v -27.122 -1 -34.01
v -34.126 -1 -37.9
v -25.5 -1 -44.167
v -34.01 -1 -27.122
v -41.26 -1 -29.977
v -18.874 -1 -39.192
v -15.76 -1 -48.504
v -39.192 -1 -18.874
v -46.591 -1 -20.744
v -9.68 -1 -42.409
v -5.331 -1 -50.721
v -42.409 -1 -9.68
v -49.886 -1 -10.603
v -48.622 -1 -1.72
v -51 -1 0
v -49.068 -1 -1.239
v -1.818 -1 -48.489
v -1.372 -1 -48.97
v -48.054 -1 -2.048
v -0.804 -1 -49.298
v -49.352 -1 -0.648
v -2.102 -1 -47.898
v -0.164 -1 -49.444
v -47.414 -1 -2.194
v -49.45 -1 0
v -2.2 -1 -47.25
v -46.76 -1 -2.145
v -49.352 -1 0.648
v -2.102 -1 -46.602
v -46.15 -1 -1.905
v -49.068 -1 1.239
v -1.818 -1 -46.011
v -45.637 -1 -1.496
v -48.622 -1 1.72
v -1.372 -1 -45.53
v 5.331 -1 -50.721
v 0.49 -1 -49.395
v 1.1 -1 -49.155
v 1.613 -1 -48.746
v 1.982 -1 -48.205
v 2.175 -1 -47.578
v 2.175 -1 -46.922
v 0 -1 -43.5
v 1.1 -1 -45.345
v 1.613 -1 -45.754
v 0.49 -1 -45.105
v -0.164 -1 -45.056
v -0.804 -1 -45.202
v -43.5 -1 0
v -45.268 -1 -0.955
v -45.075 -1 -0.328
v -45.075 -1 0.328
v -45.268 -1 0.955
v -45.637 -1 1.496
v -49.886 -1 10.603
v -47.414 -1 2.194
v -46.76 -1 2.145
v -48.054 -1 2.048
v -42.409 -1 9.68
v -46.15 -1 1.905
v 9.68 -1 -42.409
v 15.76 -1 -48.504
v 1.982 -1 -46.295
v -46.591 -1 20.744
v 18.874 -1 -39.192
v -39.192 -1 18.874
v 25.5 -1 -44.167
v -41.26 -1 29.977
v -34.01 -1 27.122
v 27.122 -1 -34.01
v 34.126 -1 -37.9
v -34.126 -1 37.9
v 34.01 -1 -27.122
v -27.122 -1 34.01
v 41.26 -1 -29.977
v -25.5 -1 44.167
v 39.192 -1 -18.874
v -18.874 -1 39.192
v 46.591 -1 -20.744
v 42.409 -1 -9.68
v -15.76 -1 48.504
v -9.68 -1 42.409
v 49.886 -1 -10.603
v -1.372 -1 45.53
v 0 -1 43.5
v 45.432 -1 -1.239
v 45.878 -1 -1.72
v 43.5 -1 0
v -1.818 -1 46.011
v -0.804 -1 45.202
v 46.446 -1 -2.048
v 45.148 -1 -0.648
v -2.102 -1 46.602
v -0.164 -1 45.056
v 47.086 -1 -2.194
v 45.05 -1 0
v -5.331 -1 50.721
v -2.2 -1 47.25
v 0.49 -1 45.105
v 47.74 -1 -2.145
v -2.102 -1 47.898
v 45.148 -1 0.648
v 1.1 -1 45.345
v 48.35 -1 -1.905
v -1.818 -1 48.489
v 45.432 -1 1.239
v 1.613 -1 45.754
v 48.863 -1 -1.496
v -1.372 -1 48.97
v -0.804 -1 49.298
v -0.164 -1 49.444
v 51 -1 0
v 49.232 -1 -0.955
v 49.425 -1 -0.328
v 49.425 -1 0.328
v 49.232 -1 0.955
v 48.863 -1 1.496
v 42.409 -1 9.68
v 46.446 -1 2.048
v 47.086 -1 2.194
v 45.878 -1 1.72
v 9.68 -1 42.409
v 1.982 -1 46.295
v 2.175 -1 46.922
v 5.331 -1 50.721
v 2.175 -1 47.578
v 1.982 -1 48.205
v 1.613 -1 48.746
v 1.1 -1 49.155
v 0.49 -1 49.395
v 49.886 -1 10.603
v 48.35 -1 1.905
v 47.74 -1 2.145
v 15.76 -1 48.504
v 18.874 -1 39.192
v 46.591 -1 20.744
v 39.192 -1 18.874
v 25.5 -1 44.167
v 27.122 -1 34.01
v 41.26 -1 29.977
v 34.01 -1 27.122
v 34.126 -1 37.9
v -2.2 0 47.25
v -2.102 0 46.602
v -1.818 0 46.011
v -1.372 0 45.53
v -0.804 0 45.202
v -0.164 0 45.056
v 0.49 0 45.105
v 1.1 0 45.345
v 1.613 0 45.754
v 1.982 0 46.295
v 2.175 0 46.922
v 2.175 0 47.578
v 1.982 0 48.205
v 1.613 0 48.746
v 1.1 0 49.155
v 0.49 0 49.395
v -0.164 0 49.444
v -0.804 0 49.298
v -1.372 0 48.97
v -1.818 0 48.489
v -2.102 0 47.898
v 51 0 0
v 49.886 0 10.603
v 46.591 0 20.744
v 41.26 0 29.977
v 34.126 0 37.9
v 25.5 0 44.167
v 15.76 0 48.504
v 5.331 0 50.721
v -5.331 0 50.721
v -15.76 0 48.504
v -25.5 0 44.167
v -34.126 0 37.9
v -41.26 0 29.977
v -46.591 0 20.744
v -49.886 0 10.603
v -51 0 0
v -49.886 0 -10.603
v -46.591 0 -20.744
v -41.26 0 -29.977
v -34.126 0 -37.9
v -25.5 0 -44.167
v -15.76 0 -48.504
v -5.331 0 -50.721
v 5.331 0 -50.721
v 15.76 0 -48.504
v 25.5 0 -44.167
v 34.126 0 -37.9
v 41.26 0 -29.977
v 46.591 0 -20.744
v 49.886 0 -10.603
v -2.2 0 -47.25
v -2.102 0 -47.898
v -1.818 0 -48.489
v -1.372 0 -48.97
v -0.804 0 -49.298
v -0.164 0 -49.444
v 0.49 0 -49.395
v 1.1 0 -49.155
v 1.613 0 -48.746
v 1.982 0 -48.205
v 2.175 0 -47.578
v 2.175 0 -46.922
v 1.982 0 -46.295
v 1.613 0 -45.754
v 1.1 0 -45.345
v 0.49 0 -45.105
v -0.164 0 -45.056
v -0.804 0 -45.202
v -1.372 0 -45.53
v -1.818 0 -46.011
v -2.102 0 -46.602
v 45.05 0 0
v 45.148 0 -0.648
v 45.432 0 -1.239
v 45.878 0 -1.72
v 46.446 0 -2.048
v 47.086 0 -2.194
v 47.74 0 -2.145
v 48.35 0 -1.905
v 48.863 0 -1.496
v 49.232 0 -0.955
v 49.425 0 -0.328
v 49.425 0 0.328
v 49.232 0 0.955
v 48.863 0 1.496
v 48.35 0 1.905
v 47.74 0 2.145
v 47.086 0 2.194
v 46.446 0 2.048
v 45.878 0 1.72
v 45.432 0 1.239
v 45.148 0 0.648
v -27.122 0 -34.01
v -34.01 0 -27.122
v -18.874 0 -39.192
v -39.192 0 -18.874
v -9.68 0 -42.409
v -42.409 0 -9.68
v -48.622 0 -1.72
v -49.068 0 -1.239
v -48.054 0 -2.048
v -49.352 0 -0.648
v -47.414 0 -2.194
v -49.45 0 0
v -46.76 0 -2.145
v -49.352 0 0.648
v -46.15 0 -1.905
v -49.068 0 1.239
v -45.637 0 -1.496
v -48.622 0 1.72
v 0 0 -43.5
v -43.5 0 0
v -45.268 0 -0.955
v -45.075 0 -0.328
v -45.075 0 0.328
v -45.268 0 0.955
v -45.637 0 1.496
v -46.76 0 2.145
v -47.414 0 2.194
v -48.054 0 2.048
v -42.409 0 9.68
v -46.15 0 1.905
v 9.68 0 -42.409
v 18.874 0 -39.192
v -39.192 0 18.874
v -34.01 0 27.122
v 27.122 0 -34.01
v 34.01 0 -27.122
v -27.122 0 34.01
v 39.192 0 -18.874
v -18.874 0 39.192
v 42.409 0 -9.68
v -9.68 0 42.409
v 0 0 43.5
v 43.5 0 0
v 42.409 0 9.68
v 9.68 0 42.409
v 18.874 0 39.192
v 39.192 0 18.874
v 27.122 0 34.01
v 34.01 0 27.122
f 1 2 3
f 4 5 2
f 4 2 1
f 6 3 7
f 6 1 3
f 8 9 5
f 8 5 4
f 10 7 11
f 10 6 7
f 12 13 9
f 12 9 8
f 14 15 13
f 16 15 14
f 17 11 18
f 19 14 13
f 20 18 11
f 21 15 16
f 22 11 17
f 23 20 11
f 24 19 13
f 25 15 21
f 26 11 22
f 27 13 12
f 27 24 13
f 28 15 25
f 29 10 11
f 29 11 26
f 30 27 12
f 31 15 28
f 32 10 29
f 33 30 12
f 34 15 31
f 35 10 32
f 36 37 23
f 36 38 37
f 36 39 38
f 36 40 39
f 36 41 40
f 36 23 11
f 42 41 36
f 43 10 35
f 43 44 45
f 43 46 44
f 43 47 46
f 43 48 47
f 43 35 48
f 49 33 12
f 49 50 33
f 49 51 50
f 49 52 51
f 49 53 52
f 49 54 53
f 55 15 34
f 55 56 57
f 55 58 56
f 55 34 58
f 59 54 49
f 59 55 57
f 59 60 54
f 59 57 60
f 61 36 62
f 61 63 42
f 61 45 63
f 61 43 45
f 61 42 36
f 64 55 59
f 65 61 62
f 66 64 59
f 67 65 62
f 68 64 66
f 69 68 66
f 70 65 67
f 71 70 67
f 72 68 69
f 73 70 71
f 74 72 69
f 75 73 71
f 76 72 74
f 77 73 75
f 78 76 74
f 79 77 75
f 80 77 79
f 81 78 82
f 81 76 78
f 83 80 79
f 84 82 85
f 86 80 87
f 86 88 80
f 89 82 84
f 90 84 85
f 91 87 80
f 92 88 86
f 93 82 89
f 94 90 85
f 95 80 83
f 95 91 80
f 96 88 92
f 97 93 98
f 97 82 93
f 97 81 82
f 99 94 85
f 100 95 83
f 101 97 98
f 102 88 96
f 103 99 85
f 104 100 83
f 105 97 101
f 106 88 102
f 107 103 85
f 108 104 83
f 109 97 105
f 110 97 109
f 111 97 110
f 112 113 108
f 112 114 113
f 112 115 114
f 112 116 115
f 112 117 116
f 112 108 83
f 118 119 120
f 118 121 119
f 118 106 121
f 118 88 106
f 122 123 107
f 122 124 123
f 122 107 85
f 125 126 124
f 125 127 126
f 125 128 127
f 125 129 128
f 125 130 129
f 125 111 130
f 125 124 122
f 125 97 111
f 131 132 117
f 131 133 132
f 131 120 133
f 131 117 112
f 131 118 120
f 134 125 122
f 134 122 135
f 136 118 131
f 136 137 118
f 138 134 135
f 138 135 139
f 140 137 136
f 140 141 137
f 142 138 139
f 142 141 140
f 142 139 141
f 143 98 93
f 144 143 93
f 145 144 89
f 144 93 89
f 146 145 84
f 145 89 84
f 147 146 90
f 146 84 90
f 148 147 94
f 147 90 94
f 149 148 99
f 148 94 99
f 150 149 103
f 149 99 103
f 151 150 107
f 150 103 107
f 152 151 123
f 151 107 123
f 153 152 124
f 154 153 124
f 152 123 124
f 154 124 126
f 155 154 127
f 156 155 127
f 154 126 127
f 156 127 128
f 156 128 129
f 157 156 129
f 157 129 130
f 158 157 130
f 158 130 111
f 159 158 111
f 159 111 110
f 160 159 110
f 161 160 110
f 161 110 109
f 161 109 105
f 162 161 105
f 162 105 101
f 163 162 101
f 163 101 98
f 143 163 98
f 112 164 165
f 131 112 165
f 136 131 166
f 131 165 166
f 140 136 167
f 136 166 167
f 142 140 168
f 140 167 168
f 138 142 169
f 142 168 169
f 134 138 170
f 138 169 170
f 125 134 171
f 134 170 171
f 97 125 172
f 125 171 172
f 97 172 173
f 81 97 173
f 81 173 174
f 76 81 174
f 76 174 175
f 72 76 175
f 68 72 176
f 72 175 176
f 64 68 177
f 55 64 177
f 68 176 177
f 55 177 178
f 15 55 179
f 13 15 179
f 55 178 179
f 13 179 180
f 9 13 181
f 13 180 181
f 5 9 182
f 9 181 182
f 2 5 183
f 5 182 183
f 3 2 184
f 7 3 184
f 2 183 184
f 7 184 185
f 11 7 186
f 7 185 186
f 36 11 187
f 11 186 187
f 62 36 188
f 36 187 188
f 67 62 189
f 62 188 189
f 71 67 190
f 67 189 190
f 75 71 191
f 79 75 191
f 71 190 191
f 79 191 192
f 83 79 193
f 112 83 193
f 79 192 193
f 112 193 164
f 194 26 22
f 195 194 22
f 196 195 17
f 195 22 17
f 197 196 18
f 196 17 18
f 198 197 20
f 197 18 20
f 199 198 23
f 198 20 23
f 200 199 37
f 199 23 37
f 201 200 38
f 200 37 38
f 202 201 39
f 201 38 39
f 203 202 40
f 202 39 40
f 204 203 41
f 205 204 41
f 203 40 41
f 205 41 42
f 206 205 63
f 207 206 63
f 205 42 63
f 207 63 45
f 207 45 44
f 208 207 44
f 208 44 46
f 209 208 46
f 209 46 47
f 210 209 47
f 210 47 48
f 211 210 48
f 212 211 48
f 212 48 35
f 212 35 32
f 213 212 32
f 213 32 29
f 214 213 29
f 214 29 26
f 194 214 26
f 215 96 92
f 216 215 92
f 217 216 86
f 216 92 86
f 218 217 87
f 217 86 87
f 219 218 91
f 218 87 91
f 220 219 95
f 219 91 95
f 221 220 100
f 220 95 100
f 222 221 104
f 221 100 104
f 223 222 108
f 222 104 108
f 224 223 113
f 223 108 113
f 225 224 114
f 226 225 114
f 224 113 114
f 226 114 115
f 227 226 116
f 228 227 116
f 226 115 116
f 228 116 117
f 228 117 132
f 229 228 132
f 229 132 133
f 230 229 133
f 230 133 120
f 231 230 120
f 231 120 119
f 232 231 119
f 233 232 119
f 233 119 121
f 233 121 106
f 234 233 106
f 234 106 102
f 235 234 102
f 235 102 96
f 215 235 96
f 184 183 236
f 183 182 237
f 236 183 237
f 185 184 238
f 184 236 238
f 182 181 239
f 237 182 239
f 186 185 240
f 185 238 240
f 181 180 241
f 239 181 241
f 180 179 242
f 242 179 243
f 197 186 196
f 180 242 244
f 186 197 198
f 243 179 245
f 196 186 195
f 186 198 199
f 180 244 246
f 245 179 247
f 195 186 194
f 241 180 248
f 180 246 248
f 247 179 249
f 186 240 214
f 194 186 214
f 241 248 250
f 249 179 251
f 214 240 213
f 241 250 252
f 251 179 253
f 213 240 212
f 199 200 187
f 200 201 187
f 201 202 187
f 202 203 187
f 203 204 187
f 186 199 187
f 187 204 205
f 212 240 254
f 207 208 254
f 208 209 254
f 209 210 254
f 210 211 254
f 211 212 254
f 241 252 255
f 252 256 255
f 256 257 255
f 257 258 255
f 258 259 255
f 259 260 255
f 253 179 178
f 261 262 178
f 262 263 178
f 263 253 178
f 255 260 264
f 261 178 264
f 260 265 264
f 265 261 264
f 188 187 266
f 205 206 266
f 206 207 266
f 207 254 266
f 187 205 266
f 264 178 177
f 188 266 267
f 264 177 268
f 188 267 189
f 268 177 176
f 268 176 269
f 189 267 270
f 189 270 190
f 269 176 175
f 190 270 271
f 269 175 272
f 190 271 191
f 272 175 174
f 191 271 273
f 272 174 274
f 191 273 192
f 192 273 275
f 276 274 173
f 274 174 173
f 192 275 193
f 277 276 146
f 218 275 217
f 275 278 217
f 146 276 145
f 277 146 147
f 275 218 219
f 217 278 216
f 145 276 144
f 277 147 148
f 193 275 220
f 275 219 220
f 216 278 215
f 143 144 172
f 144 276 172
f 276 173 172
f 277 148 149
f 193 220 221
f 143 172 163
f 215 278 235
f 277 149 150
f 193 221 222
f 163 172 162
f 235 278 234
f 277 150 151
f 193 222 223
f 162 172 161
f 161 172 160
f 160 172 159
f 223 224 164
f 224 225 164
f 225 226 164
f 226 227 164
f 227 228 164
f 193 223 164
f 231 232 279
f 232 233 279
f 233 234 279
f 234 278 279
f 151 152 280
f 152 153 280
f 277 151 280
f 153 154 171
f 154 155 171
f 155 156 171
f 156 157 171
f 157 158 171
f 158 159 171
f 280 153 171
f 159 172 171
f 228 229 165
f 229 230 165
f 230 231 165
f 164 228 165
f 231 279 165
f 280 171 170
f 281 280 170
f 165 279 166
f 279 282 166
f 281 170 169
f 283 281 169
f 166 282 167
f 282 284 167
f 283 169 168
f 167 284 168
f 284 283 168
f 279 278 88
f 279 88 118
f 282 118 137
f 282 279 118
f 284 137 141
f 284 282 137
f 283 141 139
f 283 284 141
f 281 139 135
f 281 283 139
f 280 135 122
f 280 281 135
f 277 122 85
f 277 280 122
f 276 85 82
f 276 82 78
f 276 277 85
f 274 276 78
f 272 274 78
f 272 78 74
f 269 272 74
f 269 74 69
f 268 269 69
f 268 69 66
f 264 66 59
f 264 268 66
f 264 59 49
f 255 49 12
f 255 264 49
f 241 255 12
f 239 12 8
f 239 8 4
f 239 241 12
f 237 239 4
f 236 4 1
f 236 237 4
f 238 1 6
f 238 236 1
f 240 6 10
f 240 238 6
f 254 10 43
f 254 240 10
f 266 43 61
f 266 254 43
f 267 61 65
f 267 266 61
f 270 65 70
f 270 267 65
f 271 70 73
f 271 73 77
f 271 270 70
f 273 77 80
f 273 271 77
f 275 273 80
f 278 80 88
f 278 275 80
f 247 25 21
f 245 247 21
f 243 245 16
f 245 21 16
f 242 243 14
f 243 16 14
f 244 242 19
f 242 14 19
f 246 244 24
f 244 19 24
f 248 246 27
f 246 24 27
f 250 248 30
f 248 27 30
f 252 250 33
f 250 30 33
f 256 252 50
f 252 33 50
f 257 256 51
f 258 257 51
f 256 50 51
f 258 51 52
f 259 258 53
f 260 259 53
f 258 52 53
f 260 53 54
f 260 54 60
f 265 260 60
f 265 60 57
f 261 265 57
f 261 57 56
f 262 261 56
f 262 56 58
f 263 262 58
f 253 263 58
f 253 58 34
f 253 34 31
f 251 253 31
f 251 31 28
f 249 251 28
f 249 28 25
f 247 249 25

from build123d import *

# Parameters (mm, degrees)
F0_R     = 51
F0_R_2   = 43.5
F1_DEPTH = 1
F2_D     = 4.4
F2_DEPTH = 2.5
F2_TIP   = 1.3218933619


with BuildPart() as f1:
    # F0 (on Front) → F1 (new body)
    with BuildSketch(Plane.XZ):
        Circle(F0_R)
        Circle(F0_R_2, mode=Mode.SUBTRACT)
    extrude(amount=F1_DEPTH)

    # F2
    with Locations(Plane(origin=(0, 0, 0), x_dir=(1, 0, 0), z_dir=(0, 1, 0))):
        with Locations((0, -47.25), (-47.25, 0), (0, 47.25), (47.25, 0)):
            Hole(F2_D / 2, depth=F2_DEPTH)
            with Locations((0, 0, -(F2_DEPTH + F2_TIP / 2))):  # 118° drill point
                Cone(0, F2_D / 2, F2_TIP, mode=Mode.SUBTRACT)


solid = f1.part
